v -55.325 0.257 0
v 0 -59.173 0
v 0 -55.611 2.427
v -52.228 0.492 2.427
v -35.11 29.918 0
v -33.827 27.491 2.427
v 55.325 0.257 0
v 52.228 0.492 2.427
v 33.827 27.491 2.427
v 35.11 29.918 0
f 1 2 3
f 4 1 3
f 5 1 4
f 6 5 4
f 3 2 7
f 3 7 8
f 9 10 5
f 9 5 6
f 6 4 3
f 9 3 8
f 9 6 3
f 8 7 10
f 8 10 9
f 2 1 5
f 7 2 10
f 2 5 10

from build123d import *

# Parameters (mm, degrees)
F1_DEPTH    = 2.4268273264
F2_T1_DEPTH = 99.1532575298
F3_T1_DEPTH = 59.396472342
F4_T1_DEPTH = 59.396472342
F5_T1_DEPTH = 107.0840707021
F6_T1_DEPTH = 101.9910508867


# Not quite as in the source:
# - a fillet or chamfer that OpenCascade refuses, or shapes differently, is made with other operations: its cross-section is extruded or revolved along the edge and cut away or added


with BuildPart() as f1:
    # F0 (on Top) → F1 (new body)
    with BuildSketch(Plane.XY):
        Polygon((0, 32.5707793236), (-36.5124791861, 32.5707793236), (-58.7103962898, 0), (0, -63.0669593811), align=None)
        Polygon((36.5124791861, 32.5707793236), (0, 32.5707793236), (0, -63.0669593811), (58.7103962898, 0), align=None)
    extrude(amount=F1_DEPTH)

    # F2: chamfer of 5.08 on 1 edges, made by hand

    # F2_s2 → F2_t1 (cut)
    with BuildSketch(Plane.YZ.offset(-49.5766287649)):
        Polygon((32.5707793236, -2.6531726736), (27.4907793236, 2.4268273264), (32.5707793236, 2.4268273264), align=None)
    extrude(amount=F2_T1_DEPTH, mode=Mode.SUBTRACT)

    # F3: chamfer of 5.08 on 1 edges, made by hand

    # F3_s2 → F3_t1 (cut)
    with BuildSketch(Plane(origin=(7.4722902543, 10.964015938, 0), x_dir=(0, 0, 1), z_dir=(-0.5631734509, -0.8263387103, 0))):
        Polygon((-2.6531726736, 48.5146731522), (2.4268273264, 43.4346731522), (2.4268273264, 48.5146731522), align=None)
    extrude(amount=F3_T1_DEPTH, mode=Mode.SUBTRACT)

    # F4: chamfer of 5.08 on 1 edges, made by hand

    # F4_s2 → F4_t1 (cut)
    with BuildSketch(Plane(origin=(25.9782260477, -38.1175884143, 0), x_dir=(0, 0, 1), z_dir=(-0.5631734509, 0.8263387103, 0))):
        Polygon((-2.6531726736, 48.5146731522), (2.4268273264, 43.4346731522), (2.4268273264, 48.5146731522), align=None)
    extrude(amount=F4_T1_DEPTH, mode=Mode.SUBTRACT)

    # F5: chamfer of 5.08 on 1 edges, made by hand

    # F5_s2 → F5_t1 (cut)
    with BuildSketch(Plane(origin=(-40.354442867, -43.3489155239, 0), x_dir=(0, 0, 1), z_dir=(0.6813742779, 0.7319351703, 0))):
        Polygon((-2.6531726736, 42.9722039049), (2.4268273264, 37.8922039049), (2.4268273264, 42.9722039049), align=None)
    extrude(amount=F5_T1_DEPTH, mode=Mode.SUBTRACT)

    # F6: chamfer of 5.08 on 1 edges, made by hand

    # F6_s2 → F6_t1 (cut)
    with BuildSketch(Plane(origin=(-32.6098884775, 35.0296819984, 0), x_dir=(0, 0, 1), z_dir=(0.6813742779, -0.7319351703, 0))):
        Polygon((-2.6531726736, 42.9722039049), (2.4268273264, 37.8922039049), (2.4268273264, 42.9722039049), align=None)
    extrude(amount=F6_T1_DEPTH, mode=Mode.SUBTRACT)


solid = f1.part
